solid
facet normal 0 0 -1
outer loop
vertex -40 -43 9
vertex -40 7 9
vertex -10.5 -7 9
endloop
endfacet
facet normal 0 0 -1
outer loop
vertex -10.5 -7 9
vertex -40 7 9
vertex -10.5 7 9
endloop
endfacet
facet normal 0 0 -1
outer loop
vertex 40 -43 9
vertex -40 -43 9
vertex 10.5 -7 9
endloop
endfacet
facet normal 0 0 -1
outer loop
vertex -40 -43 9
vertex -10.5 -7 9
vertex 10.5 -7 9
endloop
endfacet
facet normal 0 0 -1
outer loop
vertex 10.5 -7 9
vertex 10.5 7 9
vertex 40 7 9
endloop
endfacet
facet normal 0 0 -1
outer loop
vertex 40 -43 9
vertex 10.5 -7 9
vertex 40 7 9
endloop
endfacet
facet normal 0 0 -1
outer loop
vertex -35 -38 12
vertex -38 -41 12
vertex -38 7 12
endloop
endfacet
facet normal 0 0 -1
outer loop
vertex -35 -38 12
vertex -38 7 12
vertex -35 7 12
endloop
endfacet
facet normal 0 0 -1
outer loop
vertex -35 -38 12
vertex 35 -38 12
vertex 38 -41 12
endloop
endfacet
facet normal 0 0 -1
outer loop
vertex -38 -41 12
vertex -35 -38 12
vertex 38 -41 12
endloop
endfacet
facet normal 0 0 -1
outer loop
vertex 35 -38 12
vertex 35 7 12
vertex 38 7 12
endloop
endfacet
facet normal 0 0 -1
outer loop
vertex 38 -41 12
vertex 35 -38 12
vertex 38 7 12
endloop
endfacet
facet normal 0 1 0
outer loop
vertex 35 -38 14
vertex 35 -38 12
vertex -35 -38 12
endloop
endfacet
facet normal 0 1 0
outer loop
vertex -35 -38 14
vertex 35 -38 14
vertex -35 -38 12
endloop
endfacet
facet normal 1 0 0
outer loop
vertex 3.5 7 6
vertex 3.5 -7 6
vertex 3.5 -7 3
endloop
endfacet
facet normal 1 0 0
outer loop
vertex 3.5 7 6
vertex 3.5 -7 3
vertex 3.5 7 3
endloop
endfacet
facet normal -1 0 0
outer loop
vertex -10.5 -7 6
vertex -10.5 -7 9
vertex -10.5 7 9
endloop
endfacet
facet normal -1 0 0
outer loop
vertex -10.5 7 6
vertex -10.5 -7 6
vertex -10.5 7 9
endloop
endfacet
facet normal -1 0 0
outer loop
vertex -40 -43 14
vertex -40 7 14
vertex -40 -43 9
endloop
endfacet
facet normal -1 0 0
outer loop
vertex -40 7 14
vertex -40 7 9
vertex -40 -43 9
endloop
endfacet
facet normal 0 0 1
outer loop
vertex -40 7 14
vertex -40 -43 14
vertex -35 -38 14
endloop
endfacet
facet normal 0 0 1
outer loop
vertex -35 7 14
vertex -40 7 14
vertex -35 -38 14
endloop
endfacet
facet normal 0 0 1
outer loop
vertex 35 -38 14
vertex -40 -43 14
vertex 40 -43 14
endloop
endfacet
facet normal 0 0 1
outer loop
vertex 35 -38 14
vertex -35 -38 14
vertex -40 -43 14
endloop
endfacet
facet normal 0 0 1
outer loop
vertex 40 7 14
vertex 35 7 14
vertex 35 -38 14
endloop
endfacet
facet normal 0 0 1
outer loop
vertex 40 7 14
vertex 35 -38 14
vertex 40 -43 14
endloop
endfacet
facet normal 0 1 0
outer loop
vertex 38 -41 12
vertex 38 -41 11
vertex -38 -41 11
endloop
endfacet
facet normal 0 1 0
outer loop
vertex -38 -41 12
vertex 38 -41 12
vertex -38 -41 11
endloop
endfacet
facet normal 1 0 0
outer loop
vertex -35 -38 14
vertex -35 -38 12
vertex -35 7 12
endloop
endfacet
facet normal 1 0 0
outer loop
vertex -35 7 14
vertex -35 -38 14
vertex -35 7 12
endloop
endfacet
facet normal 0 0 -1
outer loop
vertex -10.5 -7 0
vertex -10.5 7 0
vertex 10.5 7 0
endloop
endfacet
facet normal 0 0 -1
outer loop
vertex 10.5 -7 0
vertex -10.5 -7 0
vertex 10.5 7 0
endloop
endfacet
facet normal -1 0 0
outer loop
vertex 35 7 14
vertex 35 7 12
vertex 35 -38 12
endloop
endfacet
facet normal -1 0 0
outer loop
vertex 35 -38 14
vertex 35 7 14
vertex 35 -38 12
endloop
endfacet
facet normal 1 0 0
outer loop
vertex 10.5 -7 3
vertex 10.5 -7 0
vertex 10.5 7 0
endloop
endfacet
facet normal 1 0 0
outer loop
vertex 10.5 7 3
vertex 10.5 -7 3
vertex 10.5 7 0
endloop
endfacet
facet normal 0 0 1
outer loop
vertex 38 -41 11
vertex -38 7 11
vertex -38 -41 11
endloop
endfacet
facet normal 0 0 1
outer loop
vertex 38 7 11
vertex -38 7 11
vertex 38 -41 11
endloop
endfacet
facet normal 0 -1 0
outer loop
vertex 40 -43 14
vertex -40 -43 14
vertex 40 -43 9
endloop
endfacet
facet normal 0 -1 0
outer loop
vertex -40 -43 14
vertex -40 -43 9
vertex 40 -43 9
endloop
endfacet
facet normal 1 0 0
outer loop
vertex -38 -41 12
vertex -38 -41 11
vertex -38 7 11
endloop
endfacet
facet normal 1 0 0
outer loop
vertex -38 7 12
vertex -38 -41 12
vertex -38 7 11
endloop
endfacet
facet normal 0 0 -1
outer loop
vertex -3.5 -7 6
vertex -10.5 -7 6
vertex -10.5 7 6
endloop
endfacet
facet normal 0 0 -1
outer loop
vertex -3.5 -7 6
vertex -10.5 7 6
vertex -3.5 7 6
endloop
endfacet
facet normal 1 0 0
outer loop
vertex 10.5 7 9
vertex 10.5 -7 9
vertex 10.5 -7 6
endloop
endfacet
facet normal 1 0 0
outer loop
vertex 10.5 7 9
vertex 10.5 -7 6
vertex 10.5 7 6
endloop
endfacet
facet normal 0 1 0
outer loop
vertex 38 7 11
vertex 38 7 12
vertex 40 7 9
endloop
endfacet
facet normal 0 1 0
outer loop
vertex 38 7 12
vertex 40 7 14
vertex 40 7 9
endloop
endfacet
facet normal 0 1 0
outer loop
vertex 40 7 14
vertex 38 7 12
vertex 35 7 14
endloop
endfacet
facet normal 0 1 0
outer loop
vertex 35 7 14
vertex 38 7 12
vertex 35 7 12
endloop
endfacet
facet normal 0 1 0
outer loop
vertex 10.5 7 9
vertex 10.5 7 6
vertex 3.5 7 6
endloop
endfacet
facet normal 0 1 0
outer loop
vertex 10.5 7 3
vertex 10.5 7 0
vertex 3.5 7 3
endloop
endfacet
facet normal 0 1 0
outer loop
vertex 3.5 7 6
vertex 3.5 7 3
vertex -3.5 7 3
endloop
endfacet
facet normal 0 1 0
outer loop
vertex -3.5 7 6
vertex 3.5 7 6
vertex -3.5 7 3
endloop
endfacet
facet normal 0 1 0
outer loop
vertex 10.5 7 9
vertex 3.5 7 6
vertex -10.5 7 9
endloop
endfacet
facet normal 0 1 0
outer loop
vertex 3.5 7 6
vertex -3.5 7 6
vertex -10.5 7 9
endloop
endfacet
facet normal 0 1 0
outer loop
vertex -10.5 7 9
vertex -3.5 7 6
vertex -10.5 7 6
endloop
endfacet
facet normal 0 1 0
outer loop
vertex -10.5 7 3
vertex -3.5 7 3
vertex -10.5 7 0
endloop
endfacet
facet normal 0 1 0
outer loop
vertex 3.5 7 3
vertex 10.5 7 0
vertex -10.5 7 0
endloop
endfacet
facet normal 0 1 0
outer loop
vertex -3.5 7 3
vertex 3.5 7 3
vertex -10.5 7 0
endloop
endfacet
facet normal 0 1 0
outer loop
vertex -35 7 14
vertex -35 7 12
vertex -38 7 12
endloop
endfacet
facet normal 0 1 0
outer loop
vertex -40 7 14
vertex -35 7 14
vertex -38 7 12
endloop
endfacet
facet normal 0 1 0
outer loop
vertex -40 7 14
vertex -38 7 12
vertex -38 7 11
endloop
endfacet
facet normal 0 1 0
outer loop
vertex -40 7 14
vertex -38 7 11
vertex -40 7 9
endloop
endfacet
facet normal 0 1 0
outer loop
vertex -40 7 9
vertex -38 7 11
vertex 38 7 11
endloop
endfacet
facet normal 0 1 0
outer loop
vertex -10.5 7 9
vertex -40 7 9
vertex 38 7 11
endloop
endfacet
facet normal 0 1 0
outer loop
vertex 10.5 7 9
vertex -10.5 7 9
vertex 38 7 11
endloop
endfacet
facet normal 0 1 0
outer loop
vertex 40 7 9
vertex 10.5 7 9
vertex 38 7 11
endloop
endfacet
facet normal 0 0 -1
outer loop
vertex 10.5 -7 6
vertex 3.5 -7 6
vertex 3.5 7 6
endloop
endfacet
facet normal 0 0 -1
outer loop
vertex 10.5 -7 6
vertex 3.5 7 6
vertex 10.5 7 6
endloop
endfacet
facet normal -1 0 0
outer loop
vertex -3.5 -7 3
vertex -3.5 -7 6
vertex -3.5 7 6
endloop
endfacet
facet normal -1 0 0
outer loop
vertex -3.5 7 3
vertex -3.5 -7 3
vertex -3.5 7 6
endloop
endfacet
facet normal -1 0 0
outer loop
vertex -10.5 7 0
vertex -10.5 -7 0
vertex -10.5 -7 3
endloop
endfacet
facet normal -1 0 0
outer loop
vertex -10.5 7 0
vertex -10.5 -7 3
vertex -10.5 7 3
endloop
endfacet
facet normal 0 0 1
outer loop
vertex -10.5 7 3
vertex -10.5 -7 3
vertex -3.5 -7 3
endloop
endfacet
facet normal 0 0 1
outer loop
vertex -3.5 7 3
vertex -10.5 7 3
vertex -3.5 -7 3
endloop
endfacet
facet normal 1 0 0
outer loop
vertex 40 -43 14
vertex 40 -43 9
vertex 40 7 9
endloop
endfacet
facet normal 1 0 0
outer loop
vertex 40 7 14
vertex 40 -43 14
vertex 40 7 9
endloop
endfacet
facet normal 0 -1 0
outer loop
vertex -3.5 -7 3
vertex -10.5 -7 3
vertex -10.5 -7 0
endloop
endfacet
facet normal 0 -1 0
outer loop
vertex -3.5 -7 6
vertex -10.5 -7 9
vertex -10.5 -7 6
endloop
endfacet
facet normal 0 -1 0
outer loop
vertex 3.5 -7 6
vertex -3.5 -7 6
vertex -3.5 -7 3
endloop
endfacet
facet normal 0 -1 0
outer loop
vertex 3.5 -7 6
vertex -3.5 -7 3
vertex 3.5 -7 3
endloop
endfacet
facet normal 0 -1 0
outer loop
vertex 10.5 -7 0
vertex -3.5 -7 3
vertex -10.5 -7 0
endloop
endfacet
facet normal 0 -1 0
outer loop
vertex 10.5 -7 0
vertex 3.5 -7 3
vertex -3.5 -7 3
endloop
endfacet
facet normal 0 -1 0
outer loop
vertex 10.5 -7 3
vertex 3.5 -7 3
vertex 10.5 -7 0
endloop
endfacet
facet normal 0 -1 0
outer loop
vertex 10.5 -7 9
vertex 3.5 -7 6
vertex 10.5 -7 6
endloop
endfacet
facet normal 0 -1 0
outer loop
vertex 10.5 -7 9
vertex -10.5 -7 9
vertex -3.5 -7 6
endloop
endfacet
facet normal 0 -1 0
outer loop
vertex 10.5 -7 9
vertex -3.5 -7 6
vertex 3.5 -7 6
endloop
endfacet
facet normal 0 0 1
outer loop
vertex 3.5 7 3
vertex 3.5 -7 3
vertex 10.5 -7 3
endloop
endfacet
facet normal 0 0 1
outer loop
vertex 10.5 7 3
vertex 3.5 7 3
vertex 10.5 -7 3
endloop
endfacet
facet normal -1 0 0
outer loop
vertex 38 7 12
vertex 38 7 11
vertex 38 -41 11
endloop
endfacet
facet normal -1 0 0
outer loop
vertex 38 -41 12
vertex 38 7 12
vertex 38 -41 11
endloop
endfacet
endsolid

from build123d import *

# Parameters (mm, degrees)
F0_W      = 21
F0_H      = 14
F1_DEPTH  = 3
F2_W      = 7
F2_H      = 14
F3_DEPTH  = 1.5
F5_W      = 80
F5_H      = 50
F6_DEPTH  = 2
F8_DEPTH  = 1
F10_DEPTH = 2


with BuildPart() as f1:
    # F0 (on Top) → F1 (new body)
    with BuildSketch(Plane.XY):
        Rectangle(F0_W, F0_H)
    extrude(amount=F1_DEPTH)

    # F2 (on face) → F3 (join)
    with BuildSketch(Plane.XY.offset(3)):
        Rectangle(F2_W, F2_H)
    extrude(amount=F3_DEPTH)

    # F4: F1 across face


with BuildPart() as f1_1:
    add(f1.part)
    add(f1.part.mirror(Plane.XY.offset(4.5)))

    # F5 (on face) → F6 (join)
    with BuildSketch(Plane.XY.offset(9)):
        with Locations((0, -18)):
            Rectangle(F5_W, F5_H)
    extrude(amount=F6_DEPTH)

    # F7 (on face) → F8 (join)
    with BuildSketch(Plane.XY.offset(11)):
        Polygon((-38, 7), (-40, 7), (-40, -43), (40, -43), (40, 7), (38, 7), (38, -41), (-38, -41), align=None)
    extrude(amount=F8_DEPTH)

    # F9 (on face) → F10 (join)
    with BuildSketch(Plane.XY.offset(12)):
        Polygon((-35, 7), (-40, 7), (-40, -43), (40, -43), (40, 7), (35, 7), (35, -38), (-35, -38), align=None)
    extrude(amount=F10_DEPTH)


solid = f1_1.part
